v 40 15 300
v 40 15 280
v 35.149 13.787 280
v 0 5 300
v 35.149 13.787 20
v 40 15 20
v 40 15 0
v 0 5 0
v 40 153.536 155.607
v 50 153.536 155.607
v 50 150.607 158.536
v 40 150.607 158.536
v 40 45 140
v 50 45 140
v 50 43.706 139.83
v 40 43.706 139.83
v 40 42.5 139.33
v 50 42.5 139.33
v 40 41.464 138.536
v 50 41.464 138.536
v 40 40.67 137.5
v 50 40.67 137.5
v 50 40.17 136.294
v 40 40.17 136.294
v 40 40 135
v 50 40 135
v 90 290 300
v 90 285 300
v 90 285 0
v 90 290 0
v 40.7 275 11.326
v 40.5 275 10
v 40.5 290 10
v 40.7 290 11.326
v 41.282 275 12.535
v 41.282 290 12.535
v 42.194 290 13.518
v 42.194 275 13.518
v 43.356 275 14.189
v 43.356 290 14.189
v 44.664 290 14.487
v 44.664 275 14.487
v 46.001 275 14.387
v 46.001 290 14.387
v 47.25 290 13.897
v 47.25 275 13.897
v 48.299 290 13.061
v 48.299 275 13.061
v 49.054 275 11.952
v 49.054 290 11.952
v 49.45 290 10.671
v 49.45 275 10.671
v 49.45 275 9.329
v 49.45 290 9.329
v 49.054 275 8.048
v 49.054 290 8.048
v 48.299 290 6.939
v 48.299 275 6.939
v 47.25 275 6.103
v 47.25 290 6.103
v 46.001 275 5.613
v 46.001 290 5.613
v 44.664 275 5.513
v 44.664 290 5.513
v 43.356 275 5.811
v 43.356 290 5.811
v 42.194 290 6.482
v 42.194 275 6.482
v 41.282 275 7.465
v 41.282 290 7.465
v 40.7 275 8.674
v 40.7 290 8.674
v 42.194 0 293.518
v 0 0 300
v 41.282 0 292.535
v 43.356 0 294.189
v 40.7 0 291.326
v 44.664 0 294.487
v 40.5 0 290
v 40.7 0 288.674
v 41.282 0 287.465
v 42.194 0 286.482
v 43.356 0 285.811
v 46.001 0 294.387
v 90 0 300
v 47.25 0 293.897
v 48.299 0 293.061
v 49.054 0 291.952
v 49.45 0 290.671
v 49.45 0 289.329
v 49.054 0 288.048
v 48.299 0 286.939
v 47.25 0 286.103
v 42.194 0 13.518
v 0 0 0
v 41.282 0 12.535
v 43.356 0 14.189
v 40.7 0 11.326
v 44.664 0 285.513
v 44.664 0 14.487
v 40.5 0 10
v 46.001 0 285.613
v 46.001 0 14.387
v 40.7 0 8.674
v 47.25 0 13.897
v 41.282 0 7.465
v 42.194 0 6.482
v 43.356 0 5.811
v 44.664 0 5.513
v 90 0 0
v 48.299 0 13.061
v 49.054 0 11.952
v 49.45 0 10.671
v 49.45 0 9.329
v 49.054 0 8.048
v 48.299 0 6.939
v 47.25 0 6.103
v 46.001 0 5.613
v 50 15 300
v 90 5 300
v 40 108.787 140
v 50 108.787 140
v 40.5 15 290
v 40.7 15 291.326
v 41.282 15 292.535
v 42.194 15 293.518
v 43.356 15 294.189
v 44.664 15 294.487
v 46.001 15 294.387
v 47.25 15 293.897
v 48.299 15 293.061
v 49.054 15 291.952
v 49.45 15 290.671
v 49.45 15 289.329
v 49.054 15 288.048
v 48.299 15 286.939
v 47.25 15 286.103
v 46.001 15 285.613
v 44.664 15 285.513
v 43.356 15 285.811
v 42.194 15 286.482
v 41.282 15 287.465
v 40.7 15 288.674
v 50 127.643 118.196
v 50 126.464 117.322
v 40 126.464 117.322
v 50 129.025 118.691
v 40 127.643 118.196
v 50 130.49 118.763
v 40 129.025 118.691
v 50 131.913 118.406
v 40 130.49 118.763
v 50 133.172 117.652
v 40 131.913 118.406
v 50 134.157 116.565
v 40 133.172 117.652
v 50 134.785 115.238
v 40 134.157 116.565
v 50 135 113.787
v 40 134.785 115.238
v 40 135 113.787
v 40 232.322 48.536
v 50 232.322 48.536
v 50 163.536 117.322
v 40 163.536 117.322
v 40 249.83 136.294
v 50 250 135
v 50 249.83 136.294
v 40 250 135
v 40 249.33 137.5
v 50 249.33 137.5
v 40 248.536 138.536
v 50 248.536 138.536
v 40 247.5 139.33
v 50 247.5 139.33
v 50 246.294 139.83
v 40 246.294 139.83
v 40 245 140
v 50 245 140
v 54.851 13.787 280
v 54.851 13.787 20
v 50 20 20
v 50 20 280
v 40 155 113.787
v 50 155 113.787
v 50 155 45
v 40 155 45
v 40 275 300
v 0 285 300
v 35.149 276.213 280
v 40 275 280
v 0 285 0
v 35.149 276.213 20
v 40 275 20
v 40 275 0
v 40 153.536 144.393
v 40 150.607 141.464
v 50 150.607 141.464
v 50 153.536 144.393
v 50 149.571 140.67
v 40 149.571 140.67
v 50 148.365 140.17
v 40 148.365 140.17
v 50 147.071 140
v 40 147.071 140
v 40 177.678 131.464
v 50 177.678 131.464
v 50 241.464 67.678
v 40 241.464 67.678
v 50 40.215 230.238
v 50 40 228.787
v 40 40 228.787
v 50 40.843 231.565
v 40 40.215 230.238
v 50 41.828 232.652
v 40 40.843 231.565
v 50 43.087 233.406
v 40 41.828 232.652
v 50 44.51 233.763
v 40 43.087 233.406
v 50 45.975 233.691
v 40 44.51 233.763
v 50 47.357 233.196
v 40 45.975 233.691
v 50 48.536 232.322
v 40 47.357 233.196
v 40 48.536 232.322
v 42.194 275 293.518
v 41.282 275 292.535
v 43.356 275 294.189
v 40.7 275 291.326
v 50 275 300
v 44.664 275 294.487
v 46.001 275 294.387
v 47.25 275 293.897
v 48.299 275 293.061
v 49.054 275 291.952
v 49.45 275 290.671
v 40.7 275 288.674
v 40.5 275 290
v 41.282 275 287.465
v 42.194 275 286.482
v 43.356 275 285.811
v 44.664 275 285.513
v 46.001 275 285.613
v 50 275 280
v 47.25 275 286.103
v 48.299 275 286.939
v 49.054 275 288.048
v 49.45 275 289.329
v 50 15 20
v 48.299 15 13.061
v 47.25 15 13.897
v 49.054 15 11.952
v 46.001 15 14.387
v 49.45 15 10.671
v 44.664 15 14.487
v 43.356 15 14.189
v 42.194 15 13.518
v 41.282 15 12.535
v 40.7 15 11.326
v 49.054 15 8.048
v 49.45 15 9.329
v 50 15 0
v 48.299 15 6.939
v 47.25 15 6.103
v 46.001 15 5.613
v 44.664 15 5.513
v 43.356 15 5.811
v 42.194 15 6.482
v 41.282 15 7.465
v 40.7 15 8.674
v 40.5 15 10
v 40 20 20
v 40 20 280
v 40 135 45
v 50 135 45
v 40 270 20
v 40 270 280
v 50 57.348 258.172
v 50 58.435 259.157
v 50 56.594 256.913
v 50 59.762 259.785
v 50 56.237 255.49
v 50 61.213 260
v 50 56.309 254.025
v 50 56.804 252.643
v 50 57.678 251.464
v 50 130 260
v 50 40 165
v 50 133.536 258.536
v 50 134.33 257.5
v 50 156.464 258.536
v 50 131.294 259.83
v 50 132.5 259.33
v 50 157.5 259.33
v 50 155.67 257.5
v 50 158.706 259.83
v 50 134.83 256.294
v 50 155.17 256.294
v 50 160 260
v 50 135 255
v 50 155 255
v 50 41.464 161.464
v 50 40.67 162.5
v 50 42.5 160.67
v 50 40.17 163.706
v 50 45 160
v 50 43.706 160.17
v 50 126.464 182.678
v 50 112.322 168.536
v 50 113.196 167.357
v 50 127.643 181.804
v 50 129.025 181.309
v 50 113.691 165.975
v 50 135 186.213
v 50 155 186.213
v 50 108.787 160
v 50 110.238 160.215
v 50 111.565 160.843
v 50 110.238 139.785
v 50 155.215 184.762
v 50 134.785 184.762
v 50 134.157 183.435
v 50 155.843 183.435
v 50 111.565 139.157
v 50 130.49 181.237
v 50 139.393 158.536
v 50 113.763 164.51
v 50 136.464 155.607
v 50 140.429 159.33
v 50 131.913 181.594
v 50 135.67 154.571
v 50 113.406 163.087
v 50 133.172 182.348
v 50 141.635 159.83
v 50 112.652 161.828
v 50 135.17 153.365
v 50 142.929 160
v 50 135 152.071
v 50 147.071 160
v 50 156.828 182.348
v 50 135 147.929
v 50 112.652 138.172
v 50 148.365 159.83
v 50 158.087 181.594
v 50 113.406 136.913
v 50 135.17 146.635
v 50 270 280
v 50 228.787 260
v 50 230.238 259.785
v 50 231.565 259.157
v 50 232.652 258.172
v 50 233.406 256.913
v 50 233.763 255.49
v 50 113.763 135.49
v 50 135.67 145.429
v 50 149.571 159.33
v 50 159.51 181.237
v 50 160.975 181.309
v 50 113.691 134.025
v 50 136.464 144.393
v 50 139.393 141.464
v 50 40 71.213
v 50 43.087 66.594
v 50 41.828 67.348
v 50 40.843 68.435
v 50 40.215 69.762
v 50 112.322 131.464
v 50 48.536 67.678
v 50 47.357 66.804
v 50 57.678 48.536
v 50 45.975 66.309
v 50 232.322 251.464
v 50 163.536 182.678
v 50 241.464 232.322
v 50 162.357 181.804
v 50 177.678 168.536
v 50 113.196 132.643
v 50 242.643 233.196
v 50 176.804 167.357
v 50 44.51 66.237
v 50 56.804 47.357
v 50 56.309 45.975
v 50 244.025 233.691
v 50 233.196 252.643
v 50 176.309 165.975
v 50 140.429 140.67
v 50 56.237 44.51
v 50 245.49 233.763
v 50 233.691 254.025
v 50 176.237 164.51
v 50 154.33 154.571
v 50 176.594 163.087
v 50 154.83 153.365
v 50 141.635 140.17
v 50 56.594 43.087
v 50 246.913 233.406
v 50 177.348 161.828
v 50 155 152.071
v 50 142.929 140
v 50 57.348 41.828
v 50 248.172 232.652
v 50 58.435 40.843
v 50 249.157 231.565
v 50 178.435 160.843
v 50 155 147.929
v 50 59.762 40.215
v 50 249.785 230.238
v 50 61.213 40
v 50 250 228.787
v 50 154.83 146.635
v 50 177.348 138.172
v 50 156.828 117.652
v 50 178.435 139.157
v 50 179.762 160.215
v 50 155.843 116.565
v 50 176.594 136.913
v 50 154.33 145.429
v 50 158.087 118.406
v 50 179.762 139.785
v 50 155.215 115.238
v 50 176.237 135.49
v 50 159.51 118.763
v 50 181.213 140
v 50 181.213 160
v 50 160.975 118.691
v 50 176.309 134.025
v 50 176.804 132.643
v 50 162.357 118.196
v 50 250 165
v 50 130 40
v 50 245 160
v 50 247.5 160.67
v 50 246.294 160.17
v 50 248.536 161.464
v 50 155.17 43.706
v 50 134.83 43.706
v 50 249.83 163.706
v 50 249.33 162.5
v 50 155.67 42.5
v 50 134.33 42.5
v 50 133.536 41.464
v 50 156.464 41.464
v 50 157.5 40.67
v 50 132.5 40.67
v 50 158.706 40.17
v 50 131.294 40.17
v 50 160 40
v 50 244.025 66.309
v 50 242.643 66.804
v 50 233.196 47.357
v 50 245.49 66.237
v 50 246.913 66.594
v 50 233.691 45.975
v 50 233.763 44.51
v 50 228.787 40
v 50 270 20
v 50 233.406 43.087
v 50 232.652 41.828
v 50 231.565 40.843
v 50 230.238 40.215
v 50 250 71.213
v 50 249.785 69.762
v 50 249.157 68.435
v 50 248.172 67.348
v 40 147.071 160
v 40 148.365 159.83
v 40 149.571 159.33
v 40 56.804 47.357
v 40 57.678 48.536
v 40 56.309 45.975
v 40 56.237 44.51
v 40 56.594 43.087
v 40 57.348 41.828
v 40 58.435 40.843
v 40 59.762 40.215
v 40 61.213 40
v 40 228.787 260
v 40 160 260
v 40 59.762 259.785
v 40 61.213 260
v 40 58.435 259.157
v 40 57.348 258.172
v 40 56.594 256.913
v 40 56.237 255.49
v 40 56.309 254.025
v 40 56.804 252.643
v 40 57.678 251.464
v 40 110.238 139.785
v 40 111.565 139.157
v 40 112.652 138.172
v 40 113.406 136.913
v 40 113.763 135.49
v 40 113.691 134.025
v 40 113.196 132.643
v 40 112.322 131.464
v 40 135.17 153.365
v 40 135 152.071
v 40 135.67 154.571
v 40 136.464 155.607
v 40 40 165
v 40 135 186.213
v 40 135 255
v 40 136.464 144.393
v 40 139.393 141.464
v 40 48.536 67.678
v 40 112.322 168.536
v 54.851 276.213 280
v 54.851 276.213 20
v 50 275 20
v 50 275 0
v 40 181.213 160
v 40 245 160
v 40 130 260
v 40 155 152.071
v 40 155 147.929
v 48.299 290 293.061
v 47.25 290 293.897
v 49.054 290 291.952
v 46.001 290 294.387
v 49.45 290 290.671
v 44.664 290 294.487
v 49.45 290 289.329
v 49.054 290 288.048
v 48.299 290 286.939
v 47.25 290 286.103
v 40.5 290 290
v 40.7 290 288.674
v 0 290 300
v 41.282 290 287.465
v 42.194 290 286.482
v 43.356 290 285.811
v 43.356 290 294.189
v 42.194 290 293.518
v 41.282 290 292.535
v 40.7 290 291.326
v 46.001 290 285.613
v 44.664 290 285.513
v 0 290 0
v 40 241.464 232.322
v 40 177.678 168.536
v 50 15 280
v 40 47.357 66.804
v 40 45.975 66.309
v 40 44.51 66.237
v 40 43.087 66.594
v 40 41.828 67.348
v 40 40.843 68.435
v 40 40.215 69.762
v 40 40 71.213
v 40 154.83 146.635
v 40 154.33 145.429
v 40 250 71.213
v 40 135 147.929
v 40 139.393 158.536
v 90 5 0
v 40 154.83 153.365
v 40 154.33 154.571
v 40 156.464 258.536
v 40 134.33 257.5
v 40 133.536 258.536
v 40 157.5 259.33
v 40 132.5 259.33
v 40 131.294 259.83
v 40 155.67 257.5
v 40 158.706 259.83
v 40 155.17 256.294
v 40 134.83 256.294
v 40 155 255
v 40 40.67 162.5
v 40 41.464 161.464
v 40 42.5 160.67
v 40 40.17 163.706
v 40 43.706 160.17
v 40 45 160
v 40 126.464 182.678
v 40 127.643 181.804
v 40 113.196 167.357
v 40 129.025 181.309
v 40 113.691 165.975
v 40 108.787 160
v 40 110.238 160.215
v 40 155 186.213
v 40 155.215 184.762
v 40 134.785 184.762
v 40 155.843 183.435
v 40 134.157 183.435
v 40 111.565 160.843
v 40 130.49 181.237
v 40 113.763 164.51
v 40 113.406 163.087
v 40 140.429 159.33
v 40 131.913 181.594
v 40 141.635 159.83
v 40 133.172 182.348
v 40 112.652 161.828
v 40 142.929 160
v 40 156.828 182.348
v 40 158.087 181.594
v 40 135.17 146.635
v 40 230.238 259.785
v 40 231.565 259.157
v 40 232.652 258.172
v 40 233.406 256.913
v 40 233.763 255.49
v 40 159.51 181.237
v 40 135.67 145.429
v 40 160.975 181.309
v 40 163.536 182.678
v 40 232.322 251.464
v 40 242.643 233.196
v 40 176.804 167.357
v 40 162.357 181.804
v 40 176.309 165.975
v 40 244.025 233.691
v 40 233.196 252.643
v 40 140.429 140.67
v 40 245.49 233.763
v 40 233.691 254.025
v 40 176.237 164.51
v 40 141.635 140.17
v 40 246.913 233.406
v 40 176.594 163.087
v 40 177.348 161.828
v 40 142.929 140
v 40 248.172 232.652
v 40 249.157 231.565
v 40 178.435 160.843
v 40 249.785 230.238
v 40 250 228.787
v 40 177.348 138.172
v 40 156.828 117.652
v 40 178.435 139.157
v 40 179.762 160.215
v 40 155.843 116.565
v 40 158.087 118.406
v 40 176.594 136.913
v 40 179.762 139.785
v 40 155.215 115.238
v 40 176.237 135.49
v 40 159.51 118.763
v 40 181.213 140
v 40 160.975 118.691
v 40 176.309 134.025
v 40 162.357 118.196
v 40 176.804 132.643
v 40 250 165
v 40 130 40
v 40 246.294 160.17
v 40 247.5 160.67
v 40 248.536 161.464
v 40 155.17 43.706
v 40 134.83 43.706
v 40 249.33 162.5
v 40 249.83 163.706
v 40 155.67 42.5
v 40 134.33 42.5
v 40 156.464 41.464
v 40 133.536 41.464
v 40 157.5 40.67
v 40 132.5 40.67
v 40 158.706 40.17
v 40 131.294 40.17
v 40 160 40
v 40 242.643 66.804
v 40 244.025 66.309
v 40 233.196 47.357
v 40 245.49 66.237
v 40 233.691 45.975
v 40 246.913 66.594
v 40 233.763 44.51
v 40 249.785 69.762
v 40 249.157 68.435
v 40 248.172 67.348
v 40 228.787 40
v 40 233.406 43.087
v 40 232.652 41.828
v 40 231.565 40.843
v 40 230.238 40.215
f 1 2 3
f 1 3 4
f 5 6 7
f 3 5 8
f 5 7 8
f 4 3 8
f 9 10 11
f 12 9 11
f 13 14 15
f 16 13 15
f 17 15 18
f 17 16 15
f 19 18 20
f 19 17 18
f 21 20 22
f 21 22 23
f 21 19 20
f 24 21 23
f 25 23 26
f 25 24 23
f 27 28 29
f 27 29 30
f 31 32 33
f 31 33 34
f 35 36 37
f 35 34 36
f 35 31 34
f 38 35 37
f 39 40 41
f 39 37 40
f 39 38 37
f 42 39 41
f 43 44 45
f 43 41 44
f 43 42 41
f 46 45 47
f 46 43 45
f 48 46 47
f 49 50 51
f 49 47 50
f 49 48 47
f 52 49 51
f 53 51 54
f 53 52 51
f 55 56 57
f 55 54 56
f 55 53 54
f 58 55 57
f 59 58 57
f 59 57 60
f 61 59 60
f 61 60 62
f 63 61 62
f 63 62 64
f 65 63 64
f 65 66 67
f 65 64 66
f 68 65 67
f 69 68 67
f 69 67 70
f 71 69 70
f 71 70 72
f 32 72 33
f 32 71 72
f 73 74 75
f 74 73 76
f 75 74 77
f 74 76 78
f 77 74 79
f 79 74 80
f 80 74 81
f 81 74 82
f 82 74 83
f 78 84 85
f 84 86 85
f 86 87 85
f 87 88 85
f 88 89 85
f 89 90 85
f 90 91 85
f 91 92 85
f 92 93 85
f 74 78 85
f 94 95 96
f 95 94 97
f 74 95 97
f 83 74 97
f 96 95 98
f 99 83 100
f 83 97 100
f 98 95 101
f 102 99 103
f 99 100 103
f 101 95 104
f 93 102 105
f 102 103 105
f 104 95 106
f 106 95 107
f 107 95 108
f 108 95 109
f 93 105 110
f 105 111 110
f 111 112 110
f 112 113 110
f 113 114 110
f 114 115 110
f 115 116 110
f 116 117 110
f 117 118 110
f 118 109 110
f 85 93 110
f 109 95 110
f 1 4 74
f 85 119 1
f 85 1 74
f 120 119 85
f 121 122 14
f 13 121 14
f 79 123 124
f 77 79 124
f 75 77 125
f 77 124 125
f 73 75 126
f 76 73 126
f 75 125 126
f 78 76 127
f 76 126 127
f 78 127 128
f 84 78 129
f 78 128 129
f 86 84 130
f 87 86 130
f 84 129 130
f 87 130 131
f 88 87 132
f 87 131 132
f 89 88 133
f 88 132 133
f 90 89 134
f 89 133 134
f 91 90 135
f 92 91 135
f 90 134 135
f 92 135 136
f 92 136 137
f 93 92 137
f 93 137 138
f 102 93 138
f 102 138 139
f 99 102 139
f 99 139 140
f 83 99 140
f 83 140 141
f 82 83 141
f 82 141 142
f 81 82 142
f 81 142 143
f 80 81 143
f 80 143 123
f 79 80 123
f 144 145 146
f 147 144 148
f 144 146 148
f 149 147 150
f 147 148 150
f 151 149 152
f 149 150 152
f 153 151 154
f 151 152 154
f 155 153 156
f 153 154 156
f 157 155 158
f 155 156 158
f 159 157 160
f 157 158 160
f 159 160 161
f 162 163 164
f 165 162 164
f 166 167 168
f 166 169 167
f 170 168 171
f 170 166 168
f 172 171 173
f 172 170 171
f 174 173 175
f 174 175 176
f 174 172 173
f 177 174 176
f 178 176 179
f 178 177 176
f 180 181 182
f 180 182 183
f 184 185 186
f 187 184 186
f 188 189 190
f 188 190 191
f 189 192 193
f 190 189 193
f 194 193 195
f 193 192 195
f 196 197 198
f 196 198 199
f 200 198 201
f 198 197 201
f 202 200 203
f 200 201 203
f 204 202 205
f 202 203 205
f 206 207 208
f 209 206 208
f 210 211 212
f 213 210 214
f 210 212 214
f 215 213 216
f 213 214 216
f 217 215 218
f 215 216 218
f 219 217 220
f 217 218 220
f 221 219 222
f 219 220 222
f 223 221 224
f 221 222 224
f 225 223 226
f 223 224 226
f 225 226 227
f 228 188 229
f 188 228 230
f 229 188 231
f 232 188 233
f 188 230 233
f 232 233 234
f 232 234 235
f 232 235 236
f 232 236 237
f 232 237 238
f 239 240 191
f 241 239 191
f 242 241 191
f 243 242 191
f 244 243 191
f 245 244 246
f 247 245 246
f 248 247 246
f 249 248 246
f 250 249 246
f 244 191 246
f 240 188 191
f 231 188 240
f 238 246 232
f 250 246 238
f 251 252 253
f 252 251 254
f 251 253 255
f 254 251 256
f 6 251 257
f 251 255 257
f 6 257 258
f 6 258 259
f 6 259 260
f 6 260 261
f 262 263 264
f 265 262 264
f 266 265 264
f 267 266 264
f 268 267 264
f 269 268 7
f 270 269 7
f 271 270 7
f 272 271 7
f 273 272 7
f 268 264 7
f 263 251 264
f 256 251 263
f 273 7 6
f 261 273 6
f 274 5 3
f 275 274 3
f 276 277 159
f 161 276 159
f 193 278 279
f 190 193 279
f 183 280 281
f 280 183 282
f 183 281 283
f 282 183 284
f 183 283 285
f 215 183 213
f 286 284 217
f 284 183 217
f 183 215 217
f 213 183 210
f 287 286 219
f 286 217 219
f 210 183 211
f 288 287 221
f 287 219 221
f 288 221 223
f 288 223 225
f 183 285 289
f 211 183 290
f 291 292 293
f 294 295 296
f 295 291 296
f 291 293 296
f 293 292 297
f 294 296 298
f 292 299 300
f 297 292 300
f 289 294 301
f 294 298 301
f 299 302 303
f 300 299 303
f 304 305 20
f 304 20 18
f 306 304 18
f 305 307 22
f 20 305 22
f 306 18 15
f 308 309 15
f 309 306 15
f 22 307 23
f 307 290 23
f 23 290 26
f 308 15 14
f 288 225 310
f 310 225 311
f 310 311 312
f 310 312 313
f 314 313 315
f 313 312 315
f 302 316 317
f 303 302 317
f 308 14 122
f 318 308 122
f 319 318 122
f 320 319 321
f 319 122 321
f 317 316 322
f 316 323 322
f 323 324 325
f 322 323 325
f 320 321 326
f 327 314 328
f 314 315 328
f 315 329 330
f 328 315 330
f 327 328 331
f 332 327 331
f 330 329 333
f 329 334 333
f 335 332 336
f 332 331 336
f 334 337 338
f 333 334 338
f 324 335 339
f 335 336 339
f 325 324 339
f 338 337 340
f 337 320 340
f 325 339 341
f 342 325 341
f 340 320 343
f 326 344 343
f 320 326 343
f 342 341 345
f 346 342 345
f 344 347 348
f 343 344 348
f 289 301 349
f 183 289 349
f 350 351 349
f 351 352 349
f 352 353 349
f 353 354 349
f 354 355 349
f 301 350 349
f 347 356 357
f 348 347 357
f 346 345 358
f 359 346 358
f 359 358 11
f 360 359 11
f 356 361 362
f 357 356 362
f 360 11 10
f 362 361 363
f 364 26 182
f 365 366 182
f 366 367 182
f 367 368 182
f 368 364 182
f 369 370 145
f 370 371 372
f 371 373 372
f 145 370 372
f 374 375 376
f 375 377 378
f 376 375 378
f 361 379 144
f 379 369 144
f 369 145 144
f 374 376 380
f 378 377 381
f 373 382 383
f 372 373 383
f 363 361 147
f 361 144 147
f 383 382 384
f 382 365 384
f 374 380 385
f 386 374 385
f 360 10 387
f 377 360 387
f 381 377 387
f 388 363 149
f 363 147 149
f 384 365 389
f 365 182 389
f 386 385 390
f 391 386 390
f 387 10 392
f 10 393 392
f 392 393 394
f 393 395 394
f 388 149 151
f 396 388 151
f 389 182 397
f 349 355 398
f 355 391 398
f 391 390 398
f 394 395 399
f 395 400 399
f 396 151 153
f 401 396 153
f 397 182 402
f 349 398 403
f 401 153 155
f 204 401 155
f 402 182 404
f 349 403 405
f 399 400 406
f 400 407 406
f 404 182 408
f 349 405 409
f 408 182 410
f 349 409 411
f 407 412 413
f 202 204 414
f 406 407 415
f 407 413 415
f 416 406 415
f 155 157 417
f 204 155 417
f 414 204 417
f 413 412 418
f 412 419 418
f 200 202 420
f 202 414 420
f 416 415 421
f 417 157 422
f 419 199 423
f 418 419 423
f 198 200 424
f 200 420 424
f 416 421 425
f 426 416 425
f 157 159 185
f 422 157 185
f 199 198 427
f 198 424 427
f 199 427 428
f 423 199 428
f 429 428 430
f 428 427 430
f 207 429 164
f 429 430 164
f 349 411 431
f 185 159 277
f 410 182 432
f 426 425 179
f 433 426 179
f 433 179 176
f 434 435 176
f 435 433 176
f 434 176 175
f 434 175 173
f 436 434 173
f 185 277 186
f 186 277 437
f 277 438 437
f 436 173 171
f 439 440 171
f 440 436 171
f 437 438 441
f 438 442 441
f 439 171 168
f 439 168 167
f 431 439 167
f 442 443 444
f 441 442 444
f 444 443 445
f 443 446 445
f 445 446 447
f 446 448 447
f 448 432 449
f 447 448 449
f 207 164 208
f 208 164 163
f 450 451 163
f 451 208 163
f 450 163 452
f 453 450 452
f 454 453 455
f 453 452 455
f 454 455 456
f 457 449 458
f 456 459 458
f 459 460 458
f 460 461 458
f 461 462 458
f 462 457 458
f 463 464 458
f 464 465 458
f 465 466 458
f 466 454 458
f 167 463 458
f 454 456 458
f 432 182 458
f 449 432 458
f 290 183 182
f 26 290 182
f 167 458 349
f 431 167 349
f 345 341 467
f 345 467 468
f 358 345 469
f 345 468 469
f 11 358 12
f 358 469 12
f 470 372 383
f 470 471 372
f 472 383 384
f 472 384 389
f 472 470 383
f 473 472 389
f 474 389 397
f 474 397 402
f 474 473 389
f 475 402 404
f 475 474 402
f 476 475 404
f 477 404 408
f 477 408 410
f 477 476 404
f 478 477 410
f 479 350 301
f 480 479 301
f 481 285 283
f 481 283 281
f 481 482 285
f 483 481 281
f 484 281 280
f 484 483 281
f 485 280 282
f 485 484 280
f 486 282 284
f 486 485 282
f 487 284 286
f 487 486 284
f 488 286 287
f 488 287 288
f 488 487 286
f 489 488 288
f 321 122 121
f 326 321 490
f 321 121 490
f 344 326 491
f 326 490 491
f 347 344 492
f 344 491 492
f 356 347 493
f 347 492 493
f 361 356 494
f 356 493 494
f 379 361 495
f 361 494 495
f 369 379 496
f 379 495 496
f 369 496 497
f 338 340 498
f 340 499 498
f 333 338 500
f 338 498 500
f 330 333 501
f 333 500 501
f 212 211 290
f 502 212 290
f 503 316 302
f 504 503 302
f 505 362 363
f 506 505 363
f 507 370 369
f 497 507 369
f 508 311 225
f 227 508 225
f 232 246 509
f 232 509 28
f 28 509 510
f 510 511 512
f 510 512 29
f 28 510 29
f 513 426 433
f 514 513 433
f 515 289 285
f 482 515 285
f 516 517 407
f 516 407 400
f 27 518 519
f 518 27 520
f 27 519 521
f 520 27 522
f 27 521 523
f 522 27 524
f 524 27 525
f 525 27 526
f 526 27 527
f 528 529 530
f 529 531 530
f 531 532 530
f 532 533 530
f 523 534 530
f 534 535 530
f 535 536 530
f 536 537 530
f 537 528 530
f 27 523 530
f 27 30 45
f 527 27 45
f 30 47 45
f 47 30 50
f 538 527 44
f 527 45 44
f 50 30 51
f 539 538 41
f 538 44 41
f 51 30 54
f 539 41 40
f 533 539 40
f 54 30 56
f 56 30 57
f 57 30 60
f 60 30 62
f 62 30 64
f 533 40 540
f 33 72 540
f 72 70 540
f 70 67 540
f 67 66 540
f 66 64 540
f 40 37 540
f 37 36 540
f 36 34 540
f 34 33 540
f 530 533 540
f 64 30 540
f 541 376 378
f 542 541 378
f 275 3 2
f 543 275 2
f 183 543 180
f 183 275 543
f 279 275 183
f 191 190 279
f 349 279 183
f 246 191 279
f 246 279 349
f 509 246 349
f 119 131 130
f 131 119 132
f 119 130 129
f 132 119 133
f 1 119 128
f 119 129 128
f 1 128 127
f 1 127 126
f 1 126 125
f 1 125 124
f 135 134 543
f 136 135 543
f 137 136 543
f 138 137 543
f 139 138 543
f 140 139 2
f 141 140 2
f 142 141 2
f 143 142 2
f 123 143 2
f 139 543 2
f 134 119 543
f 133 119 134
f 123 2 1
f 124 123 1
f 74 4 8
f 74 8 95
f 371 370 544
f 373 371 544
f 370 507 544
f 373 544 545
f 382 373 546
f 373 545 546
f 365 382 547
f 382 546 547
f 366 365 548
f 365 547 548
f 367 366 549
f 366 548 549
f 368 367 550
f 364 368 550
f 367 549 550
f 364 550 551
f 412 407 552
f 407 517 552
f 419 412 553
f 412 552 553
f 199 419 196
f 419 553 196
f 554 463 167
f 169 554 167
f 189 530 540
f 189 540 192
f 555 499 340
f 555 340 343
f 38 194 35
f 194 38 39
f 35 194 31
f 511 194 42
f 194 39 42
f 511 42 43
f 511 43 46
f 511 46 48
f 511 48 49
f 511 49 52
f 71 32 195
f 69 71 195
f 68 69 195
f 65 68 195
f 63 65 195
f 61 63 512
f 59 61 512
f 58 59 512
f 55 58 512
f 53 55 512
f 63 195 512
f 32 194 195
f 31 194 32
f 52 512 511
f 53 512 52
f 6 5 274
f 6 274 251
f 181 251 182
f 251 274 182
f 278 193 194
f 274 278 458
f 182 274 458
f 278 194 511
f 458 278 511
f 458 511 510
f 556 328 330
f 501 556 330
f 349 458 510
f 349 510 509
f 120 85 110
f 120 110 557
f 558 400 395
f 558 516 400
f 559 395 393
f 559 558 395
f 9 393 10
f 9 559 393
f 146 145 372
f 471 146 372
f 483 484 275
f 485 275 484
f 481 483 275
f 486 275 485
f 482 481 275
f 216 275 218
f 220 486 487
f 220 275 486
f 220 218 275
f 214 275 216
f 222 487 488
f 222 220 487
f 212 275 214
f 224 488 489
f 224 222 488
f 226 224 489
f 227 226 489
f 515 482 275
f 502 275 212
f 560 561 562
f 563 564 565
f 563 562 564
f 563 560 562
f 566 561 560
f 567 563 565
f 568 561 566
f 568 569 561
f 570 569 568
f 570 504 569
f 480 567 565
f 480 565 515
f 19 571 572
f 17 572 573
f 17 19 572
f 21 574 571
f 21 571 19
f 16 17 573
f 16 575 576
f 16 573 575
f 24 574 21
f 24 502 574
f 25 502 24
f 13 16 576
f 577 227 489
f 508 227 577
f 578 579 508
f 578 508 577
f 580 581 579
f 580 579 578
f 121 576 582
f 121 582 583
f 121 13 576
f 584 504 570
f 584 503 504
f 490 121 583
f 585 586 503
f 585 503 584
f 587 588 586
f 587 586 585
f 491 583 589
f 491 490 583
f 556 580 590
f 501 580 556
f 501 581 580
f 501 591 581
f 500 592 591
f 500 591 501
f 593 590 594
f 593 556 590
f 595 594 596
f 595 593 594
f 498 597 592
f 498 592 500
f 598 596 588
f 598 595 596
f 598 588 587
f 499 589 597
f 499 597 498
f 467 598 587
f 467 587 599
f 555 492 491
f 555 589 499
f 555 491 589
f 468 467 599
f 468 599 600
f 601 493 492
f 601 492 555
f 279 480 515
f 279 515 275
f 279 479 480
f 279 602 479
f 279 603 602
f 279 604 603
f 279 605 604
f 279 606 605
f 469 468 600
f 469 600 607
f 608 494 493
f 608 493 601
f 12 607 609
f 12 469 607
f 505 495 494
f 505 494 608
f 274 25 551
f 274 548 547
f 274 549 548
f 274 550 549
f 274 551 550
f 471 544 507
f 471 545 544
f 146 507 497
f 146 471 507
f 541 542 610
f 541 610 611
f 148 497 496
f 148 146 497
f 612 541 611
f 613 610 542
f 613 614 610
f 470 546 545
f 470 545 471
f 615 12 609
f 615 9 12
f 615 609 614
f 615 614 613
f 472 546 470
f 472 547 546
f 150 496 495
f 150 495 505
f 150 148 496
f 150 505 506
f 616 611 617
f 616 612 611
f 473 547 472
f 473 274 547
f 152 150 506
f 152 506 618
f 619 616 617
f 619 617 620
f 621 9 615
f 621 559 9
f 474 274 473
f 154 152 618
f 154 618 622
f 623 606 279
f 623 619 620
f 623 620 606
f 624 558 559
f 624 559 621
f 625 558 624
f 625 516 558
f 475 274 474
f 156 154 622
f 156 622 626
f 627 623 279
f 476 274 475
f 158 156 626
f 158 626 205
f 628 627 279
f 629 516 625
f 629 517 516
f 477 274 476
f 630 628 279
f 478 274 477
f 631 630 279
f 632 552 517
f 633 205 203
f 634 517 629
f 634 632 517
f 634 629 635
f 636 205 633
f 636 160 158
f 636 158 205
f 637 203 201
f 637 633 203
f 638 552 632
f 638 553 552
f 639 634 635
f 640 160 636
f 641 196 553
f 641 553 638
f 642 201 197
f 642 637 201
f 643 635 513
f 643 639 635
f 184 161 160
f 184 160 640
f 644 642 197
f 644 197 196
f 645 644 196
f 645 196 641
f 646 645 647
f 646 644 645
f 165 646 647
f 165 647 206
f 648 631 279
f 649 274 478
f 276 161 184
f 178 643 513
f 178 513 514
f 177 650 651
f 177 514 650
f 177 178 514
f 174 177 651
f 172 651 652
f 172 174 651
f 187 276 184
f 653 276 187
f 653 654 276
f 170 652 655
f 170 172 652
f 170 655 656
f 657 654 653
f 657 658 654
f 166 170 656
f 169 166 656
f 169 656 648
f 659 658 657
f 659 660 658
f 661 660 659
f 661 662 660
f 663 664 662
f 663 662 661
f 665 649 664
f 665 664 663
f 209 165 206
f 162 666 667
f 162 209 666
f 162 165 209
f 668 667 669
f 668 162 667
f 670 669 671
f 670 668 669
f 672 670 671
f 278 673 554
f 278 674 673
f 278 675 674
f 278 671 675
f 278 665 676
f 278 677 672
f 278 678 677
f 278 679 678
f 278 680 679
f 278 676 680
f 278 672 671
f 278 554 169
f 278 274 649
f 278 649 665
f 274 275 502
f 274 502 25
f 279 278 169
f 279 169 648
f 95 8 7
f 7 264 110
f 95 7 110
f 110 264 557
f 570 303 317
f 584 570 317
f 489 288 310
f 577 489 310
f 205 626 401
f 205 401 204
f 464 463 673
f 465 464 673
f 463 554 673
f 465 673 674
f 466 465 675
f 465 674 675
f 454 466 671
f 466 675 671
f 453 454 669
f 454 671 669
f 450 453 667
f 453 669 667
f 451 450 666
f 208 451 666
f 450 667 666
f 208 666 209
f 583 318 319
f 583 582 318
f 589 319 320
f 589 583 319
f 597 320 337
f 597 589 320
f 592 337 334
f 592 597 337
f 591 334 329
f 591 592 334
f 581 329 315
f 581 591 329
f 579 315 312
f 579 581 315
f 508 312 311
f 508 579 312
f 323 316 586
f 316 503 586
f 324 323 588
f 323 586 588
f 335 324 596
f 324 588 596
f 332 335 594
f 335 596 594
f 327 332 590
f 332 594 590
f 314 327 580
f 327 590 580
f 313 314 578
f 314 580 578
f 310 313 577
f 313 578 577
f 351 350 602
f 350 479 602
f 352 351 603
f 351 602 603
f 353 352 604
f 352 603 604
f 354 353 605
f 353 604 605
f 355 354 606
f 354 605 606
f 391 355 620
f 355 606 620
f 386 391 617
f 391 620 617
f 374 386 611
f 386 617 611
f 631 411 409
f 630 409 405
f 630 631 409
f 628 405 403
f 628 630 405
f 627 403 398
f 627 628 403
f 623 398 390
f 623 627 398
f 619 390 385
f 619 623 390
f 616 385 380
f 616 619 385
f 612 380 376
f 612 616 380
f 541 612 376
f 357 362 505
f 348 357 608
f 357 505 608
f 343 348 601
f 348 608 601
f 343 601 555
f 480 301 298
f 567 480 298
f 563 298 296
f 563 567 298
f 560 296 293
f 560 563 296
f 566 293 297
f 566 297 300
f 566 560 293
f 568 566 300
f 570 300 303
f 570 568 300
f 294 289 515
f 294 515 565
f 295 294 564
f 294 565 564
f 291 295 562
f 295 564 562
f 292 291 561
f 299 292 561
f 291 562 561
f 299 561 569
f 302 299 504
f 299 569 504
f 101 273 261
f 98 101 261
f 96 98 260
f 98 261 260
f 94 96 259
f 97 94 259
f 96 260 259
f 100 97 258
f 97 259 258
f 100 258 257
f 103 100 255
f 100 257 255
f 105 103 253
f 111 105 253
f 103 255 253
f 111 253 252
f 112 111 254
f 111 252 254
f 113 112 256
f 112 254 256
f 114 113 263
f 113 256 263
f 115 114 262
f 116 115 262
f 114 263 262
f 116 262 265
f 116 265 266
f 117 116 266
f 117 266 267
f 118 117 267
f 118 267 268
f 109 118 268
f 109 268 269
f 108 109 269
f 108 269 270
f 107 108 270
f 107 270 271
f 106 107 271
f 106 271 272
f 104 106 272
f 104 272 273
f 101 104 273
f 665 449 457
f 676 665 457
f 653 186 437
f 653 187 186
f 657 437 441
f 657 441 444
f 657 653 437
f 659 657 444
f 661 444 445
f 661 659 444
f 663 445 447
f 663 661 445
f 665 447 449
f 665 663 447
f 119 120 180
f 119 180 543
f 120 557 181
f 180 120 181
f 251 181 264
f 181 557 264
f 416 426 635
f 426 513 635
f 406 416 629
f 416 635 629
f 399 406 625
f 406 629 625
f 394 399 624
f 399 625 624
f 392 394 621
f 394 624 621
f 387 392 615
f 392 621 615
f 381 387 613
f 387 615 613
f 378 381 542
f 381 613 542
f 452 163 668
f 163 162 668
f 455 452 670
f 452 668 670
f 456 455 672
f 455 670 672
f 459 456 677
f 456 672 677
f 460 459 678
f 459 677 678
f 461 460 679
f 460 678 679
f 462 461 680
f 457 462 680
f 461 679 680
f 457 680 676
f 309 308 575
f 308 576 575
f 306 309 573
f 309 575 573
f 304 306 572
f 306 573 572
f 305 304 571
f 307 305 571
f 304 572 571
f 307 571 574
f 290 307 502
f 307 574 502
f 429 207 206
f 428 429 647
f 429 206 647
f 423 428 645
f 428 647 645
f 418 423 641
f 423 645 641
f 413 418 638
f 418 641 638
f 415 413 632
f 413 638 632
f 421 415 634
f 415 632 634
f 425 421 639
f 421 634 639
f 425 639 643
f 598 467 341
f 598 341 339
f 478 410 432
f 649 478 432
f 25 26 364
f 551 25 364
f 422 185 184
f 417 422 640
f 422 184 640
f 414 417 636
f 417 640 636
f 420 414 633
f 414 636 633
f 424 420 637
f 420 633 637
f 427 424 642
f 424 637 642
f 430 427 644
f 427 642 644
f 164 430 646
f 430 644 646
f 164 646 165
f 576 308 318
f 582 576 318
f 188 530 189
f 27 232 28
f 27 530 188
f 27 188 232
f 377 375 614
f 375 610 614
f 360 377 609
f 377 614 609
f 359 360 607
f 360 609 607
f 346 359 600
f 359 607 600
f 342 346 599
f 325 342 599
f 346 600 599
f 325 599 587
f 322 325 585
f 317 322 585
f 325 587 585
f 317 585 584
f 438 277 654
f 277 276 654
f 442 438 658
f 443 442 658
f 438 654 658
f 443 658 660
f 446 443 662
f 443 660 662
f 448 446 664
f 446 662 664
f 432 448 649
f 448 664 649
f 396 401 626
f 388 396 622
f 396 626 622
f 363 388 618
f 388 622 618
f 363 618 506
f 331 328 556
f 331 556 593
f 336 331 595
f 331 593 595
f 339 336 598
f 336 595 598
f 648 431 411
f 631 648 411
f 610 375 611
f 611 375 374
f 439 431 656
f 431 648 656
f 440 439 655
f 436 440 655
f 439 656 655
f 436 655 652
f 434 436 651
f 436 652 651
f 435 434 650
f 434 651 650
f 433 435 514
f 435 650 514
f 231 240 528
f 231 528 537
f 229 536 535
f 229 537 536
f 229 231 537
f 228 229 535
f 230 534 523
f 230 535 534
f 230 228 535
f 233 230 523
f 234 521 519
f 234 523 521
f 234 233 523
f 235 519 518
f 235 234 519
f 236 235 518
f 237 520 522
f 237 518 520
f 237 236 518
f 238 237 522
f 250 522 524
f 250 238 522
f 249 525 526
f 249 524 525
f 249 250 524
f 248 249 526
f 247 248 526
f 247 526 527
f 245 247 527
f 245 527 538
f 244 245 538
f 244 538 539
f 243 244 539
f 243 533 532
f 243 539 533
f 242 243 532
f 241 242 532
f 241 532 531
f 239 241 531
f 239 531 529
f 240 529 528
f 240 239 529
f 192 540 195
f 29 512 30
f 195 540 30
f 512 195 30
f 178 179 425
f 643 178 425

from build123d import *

# Parameters (mm, degrees)
F1_START      = 20
F0_W          = 10
F0_H          = 260
F1_DEPTH      = 260
F2_DEPTH      = 300
F3_R          = 4.5
F4_DEPTH      = 15.001
F4_DEPTH_BACK = 275.001
F5_SIZE       = 5
F7_DEPTH      = 50.001
F8_R          = 5


with BuildPart() as f1:
    # F0 (on Top) → F1 (new body)
    with BuildSketch(Plane.XY.offset(F1_START)):
        with Locations((45, 145)):
            Rectangle(F0_W, F0_H)
    extrude(amount=F1_DEPTH)

    # F0 (on Top) → F2 (join)
    with BuildSketch(Plane.XY):
        Polygon((45, 290), (0, 290), (0, 285), (40, 275), (50, 275), (90, 285), (90, 290), align=None)
        Polygon((50, 15), (40, 15), (0, 5), (0, 0), (45, 0), (90, 0), (90, 5), align=None)
    extrude(amount=F2_DEPTH)

    # F3 (on face) → F4 (cut, two sides)
    with BuildSketch(Plane(origin=(0, 15, 0), x_dir=(-1, 0, 0), z_dir=(0, 1, 0))) as f4_sk:
        with Locations((-45, 290)):
            Circle(F3_R)
        with Locations((-45, 10)):
            Circle(F3_R)
    extrude(amount=-F4_DEPTH, mode=Mode.SUBTRACT)
    extrude(f4_sk.sketch, amount=F4_DEPTH_BACK, mode=Mode.SUBTRACT)

    # F5
    f5_edges = [f1.edges().sort_by_distance(p)[0] for p in [
        (50, 275, 150),
        (40, 275, 150),
        (40, 15, 150),
        (50, 15, 150),
    ]]
    chamfer(f5_edges, length=F5_SIZE)

    # F6 (on face) → F7 (cut, through all)
    with BuildSketch(Plane.YZ.offset(50)):
        Polygon((135, 260), (49.1421356237, 260), (135, 174.1421356237), align=None)
        Polygon((240.8578643763, 260), (155, 260), (155, 174.1421356237), align=None)
        Polygon((250, 160), (250, 240.8578643763), (169.1421356237, 160), align=None)
        Polygon((250, 59.1421356237), (250, 140), (169.1421356237, 140), align=None)
        Polygon((155, 125.8578643763), (155, 40), (240.8578643763, 40), align=None)
        Polygon((135, 125.8578643763), (49.1421356237, 40), (135, 40), align=None)
        Polygon((120.8578643763, 140), (40, 140), (40, 59.1421356237), align=None)
        Polygon((40, 160), (120.8578643763, 160), (40, 240.8578643763), align=None)
        Polygon((155, 145.8578643763), (155, 154.1421356237), (149.1421356237, 160), (140.8578643763, 160), (135, 154.1421356237), (135, 145.8578643763), (140.8578643763, 140), (149.1421356237, 140), align=None)
    extrude(amount=-F7_DEPTH, mode=Mode.SUBTRACT)

    # F8
    f8_edges = [f1.edges().sort_by_distance(p)[0] for p in [
        (45, 240.857864, 260),
        (45, 155, 260),
        (45, 155, 174.142136),
        (45, 250, 240.857864),
        (45, 250, 160),
        (45, 169.142136, 160),
        (45, 250, 140),
        (45, 250, 59.142136),
        (45, 169.142136, 140),
        (45, 155, 125.857864),
        (45, 240.857864, 40),
        (45, 155, 40),
        (45, 135, 125.857864),
        (45, 135, 40),
        (45, 49.142136, 40),
        (45, 40, 59.142136),
        (45, 40, 140),
        (45, 120.857864, 140),
        (45, 40, 160),
        (45, 40, 240.857864),
        (45, 120.857864, 160),
        (45, 135, 174.142136),
        (45, 49.142136, 260),
        (45, 135, 260),
        (45, 135, 145.857864),
        (45, 135, 154.142136),
        (45, 140.857864, 160),
        (45, 149.142136, 160),
        (45, 155, 154.142136),
        (45, 155, 145.857864),
        (45, 149.142136, 140),
        (45, 140.857864, 140),
    ]]
    fillet(f8_edges, radius=F8_R)


solid = f1.part
